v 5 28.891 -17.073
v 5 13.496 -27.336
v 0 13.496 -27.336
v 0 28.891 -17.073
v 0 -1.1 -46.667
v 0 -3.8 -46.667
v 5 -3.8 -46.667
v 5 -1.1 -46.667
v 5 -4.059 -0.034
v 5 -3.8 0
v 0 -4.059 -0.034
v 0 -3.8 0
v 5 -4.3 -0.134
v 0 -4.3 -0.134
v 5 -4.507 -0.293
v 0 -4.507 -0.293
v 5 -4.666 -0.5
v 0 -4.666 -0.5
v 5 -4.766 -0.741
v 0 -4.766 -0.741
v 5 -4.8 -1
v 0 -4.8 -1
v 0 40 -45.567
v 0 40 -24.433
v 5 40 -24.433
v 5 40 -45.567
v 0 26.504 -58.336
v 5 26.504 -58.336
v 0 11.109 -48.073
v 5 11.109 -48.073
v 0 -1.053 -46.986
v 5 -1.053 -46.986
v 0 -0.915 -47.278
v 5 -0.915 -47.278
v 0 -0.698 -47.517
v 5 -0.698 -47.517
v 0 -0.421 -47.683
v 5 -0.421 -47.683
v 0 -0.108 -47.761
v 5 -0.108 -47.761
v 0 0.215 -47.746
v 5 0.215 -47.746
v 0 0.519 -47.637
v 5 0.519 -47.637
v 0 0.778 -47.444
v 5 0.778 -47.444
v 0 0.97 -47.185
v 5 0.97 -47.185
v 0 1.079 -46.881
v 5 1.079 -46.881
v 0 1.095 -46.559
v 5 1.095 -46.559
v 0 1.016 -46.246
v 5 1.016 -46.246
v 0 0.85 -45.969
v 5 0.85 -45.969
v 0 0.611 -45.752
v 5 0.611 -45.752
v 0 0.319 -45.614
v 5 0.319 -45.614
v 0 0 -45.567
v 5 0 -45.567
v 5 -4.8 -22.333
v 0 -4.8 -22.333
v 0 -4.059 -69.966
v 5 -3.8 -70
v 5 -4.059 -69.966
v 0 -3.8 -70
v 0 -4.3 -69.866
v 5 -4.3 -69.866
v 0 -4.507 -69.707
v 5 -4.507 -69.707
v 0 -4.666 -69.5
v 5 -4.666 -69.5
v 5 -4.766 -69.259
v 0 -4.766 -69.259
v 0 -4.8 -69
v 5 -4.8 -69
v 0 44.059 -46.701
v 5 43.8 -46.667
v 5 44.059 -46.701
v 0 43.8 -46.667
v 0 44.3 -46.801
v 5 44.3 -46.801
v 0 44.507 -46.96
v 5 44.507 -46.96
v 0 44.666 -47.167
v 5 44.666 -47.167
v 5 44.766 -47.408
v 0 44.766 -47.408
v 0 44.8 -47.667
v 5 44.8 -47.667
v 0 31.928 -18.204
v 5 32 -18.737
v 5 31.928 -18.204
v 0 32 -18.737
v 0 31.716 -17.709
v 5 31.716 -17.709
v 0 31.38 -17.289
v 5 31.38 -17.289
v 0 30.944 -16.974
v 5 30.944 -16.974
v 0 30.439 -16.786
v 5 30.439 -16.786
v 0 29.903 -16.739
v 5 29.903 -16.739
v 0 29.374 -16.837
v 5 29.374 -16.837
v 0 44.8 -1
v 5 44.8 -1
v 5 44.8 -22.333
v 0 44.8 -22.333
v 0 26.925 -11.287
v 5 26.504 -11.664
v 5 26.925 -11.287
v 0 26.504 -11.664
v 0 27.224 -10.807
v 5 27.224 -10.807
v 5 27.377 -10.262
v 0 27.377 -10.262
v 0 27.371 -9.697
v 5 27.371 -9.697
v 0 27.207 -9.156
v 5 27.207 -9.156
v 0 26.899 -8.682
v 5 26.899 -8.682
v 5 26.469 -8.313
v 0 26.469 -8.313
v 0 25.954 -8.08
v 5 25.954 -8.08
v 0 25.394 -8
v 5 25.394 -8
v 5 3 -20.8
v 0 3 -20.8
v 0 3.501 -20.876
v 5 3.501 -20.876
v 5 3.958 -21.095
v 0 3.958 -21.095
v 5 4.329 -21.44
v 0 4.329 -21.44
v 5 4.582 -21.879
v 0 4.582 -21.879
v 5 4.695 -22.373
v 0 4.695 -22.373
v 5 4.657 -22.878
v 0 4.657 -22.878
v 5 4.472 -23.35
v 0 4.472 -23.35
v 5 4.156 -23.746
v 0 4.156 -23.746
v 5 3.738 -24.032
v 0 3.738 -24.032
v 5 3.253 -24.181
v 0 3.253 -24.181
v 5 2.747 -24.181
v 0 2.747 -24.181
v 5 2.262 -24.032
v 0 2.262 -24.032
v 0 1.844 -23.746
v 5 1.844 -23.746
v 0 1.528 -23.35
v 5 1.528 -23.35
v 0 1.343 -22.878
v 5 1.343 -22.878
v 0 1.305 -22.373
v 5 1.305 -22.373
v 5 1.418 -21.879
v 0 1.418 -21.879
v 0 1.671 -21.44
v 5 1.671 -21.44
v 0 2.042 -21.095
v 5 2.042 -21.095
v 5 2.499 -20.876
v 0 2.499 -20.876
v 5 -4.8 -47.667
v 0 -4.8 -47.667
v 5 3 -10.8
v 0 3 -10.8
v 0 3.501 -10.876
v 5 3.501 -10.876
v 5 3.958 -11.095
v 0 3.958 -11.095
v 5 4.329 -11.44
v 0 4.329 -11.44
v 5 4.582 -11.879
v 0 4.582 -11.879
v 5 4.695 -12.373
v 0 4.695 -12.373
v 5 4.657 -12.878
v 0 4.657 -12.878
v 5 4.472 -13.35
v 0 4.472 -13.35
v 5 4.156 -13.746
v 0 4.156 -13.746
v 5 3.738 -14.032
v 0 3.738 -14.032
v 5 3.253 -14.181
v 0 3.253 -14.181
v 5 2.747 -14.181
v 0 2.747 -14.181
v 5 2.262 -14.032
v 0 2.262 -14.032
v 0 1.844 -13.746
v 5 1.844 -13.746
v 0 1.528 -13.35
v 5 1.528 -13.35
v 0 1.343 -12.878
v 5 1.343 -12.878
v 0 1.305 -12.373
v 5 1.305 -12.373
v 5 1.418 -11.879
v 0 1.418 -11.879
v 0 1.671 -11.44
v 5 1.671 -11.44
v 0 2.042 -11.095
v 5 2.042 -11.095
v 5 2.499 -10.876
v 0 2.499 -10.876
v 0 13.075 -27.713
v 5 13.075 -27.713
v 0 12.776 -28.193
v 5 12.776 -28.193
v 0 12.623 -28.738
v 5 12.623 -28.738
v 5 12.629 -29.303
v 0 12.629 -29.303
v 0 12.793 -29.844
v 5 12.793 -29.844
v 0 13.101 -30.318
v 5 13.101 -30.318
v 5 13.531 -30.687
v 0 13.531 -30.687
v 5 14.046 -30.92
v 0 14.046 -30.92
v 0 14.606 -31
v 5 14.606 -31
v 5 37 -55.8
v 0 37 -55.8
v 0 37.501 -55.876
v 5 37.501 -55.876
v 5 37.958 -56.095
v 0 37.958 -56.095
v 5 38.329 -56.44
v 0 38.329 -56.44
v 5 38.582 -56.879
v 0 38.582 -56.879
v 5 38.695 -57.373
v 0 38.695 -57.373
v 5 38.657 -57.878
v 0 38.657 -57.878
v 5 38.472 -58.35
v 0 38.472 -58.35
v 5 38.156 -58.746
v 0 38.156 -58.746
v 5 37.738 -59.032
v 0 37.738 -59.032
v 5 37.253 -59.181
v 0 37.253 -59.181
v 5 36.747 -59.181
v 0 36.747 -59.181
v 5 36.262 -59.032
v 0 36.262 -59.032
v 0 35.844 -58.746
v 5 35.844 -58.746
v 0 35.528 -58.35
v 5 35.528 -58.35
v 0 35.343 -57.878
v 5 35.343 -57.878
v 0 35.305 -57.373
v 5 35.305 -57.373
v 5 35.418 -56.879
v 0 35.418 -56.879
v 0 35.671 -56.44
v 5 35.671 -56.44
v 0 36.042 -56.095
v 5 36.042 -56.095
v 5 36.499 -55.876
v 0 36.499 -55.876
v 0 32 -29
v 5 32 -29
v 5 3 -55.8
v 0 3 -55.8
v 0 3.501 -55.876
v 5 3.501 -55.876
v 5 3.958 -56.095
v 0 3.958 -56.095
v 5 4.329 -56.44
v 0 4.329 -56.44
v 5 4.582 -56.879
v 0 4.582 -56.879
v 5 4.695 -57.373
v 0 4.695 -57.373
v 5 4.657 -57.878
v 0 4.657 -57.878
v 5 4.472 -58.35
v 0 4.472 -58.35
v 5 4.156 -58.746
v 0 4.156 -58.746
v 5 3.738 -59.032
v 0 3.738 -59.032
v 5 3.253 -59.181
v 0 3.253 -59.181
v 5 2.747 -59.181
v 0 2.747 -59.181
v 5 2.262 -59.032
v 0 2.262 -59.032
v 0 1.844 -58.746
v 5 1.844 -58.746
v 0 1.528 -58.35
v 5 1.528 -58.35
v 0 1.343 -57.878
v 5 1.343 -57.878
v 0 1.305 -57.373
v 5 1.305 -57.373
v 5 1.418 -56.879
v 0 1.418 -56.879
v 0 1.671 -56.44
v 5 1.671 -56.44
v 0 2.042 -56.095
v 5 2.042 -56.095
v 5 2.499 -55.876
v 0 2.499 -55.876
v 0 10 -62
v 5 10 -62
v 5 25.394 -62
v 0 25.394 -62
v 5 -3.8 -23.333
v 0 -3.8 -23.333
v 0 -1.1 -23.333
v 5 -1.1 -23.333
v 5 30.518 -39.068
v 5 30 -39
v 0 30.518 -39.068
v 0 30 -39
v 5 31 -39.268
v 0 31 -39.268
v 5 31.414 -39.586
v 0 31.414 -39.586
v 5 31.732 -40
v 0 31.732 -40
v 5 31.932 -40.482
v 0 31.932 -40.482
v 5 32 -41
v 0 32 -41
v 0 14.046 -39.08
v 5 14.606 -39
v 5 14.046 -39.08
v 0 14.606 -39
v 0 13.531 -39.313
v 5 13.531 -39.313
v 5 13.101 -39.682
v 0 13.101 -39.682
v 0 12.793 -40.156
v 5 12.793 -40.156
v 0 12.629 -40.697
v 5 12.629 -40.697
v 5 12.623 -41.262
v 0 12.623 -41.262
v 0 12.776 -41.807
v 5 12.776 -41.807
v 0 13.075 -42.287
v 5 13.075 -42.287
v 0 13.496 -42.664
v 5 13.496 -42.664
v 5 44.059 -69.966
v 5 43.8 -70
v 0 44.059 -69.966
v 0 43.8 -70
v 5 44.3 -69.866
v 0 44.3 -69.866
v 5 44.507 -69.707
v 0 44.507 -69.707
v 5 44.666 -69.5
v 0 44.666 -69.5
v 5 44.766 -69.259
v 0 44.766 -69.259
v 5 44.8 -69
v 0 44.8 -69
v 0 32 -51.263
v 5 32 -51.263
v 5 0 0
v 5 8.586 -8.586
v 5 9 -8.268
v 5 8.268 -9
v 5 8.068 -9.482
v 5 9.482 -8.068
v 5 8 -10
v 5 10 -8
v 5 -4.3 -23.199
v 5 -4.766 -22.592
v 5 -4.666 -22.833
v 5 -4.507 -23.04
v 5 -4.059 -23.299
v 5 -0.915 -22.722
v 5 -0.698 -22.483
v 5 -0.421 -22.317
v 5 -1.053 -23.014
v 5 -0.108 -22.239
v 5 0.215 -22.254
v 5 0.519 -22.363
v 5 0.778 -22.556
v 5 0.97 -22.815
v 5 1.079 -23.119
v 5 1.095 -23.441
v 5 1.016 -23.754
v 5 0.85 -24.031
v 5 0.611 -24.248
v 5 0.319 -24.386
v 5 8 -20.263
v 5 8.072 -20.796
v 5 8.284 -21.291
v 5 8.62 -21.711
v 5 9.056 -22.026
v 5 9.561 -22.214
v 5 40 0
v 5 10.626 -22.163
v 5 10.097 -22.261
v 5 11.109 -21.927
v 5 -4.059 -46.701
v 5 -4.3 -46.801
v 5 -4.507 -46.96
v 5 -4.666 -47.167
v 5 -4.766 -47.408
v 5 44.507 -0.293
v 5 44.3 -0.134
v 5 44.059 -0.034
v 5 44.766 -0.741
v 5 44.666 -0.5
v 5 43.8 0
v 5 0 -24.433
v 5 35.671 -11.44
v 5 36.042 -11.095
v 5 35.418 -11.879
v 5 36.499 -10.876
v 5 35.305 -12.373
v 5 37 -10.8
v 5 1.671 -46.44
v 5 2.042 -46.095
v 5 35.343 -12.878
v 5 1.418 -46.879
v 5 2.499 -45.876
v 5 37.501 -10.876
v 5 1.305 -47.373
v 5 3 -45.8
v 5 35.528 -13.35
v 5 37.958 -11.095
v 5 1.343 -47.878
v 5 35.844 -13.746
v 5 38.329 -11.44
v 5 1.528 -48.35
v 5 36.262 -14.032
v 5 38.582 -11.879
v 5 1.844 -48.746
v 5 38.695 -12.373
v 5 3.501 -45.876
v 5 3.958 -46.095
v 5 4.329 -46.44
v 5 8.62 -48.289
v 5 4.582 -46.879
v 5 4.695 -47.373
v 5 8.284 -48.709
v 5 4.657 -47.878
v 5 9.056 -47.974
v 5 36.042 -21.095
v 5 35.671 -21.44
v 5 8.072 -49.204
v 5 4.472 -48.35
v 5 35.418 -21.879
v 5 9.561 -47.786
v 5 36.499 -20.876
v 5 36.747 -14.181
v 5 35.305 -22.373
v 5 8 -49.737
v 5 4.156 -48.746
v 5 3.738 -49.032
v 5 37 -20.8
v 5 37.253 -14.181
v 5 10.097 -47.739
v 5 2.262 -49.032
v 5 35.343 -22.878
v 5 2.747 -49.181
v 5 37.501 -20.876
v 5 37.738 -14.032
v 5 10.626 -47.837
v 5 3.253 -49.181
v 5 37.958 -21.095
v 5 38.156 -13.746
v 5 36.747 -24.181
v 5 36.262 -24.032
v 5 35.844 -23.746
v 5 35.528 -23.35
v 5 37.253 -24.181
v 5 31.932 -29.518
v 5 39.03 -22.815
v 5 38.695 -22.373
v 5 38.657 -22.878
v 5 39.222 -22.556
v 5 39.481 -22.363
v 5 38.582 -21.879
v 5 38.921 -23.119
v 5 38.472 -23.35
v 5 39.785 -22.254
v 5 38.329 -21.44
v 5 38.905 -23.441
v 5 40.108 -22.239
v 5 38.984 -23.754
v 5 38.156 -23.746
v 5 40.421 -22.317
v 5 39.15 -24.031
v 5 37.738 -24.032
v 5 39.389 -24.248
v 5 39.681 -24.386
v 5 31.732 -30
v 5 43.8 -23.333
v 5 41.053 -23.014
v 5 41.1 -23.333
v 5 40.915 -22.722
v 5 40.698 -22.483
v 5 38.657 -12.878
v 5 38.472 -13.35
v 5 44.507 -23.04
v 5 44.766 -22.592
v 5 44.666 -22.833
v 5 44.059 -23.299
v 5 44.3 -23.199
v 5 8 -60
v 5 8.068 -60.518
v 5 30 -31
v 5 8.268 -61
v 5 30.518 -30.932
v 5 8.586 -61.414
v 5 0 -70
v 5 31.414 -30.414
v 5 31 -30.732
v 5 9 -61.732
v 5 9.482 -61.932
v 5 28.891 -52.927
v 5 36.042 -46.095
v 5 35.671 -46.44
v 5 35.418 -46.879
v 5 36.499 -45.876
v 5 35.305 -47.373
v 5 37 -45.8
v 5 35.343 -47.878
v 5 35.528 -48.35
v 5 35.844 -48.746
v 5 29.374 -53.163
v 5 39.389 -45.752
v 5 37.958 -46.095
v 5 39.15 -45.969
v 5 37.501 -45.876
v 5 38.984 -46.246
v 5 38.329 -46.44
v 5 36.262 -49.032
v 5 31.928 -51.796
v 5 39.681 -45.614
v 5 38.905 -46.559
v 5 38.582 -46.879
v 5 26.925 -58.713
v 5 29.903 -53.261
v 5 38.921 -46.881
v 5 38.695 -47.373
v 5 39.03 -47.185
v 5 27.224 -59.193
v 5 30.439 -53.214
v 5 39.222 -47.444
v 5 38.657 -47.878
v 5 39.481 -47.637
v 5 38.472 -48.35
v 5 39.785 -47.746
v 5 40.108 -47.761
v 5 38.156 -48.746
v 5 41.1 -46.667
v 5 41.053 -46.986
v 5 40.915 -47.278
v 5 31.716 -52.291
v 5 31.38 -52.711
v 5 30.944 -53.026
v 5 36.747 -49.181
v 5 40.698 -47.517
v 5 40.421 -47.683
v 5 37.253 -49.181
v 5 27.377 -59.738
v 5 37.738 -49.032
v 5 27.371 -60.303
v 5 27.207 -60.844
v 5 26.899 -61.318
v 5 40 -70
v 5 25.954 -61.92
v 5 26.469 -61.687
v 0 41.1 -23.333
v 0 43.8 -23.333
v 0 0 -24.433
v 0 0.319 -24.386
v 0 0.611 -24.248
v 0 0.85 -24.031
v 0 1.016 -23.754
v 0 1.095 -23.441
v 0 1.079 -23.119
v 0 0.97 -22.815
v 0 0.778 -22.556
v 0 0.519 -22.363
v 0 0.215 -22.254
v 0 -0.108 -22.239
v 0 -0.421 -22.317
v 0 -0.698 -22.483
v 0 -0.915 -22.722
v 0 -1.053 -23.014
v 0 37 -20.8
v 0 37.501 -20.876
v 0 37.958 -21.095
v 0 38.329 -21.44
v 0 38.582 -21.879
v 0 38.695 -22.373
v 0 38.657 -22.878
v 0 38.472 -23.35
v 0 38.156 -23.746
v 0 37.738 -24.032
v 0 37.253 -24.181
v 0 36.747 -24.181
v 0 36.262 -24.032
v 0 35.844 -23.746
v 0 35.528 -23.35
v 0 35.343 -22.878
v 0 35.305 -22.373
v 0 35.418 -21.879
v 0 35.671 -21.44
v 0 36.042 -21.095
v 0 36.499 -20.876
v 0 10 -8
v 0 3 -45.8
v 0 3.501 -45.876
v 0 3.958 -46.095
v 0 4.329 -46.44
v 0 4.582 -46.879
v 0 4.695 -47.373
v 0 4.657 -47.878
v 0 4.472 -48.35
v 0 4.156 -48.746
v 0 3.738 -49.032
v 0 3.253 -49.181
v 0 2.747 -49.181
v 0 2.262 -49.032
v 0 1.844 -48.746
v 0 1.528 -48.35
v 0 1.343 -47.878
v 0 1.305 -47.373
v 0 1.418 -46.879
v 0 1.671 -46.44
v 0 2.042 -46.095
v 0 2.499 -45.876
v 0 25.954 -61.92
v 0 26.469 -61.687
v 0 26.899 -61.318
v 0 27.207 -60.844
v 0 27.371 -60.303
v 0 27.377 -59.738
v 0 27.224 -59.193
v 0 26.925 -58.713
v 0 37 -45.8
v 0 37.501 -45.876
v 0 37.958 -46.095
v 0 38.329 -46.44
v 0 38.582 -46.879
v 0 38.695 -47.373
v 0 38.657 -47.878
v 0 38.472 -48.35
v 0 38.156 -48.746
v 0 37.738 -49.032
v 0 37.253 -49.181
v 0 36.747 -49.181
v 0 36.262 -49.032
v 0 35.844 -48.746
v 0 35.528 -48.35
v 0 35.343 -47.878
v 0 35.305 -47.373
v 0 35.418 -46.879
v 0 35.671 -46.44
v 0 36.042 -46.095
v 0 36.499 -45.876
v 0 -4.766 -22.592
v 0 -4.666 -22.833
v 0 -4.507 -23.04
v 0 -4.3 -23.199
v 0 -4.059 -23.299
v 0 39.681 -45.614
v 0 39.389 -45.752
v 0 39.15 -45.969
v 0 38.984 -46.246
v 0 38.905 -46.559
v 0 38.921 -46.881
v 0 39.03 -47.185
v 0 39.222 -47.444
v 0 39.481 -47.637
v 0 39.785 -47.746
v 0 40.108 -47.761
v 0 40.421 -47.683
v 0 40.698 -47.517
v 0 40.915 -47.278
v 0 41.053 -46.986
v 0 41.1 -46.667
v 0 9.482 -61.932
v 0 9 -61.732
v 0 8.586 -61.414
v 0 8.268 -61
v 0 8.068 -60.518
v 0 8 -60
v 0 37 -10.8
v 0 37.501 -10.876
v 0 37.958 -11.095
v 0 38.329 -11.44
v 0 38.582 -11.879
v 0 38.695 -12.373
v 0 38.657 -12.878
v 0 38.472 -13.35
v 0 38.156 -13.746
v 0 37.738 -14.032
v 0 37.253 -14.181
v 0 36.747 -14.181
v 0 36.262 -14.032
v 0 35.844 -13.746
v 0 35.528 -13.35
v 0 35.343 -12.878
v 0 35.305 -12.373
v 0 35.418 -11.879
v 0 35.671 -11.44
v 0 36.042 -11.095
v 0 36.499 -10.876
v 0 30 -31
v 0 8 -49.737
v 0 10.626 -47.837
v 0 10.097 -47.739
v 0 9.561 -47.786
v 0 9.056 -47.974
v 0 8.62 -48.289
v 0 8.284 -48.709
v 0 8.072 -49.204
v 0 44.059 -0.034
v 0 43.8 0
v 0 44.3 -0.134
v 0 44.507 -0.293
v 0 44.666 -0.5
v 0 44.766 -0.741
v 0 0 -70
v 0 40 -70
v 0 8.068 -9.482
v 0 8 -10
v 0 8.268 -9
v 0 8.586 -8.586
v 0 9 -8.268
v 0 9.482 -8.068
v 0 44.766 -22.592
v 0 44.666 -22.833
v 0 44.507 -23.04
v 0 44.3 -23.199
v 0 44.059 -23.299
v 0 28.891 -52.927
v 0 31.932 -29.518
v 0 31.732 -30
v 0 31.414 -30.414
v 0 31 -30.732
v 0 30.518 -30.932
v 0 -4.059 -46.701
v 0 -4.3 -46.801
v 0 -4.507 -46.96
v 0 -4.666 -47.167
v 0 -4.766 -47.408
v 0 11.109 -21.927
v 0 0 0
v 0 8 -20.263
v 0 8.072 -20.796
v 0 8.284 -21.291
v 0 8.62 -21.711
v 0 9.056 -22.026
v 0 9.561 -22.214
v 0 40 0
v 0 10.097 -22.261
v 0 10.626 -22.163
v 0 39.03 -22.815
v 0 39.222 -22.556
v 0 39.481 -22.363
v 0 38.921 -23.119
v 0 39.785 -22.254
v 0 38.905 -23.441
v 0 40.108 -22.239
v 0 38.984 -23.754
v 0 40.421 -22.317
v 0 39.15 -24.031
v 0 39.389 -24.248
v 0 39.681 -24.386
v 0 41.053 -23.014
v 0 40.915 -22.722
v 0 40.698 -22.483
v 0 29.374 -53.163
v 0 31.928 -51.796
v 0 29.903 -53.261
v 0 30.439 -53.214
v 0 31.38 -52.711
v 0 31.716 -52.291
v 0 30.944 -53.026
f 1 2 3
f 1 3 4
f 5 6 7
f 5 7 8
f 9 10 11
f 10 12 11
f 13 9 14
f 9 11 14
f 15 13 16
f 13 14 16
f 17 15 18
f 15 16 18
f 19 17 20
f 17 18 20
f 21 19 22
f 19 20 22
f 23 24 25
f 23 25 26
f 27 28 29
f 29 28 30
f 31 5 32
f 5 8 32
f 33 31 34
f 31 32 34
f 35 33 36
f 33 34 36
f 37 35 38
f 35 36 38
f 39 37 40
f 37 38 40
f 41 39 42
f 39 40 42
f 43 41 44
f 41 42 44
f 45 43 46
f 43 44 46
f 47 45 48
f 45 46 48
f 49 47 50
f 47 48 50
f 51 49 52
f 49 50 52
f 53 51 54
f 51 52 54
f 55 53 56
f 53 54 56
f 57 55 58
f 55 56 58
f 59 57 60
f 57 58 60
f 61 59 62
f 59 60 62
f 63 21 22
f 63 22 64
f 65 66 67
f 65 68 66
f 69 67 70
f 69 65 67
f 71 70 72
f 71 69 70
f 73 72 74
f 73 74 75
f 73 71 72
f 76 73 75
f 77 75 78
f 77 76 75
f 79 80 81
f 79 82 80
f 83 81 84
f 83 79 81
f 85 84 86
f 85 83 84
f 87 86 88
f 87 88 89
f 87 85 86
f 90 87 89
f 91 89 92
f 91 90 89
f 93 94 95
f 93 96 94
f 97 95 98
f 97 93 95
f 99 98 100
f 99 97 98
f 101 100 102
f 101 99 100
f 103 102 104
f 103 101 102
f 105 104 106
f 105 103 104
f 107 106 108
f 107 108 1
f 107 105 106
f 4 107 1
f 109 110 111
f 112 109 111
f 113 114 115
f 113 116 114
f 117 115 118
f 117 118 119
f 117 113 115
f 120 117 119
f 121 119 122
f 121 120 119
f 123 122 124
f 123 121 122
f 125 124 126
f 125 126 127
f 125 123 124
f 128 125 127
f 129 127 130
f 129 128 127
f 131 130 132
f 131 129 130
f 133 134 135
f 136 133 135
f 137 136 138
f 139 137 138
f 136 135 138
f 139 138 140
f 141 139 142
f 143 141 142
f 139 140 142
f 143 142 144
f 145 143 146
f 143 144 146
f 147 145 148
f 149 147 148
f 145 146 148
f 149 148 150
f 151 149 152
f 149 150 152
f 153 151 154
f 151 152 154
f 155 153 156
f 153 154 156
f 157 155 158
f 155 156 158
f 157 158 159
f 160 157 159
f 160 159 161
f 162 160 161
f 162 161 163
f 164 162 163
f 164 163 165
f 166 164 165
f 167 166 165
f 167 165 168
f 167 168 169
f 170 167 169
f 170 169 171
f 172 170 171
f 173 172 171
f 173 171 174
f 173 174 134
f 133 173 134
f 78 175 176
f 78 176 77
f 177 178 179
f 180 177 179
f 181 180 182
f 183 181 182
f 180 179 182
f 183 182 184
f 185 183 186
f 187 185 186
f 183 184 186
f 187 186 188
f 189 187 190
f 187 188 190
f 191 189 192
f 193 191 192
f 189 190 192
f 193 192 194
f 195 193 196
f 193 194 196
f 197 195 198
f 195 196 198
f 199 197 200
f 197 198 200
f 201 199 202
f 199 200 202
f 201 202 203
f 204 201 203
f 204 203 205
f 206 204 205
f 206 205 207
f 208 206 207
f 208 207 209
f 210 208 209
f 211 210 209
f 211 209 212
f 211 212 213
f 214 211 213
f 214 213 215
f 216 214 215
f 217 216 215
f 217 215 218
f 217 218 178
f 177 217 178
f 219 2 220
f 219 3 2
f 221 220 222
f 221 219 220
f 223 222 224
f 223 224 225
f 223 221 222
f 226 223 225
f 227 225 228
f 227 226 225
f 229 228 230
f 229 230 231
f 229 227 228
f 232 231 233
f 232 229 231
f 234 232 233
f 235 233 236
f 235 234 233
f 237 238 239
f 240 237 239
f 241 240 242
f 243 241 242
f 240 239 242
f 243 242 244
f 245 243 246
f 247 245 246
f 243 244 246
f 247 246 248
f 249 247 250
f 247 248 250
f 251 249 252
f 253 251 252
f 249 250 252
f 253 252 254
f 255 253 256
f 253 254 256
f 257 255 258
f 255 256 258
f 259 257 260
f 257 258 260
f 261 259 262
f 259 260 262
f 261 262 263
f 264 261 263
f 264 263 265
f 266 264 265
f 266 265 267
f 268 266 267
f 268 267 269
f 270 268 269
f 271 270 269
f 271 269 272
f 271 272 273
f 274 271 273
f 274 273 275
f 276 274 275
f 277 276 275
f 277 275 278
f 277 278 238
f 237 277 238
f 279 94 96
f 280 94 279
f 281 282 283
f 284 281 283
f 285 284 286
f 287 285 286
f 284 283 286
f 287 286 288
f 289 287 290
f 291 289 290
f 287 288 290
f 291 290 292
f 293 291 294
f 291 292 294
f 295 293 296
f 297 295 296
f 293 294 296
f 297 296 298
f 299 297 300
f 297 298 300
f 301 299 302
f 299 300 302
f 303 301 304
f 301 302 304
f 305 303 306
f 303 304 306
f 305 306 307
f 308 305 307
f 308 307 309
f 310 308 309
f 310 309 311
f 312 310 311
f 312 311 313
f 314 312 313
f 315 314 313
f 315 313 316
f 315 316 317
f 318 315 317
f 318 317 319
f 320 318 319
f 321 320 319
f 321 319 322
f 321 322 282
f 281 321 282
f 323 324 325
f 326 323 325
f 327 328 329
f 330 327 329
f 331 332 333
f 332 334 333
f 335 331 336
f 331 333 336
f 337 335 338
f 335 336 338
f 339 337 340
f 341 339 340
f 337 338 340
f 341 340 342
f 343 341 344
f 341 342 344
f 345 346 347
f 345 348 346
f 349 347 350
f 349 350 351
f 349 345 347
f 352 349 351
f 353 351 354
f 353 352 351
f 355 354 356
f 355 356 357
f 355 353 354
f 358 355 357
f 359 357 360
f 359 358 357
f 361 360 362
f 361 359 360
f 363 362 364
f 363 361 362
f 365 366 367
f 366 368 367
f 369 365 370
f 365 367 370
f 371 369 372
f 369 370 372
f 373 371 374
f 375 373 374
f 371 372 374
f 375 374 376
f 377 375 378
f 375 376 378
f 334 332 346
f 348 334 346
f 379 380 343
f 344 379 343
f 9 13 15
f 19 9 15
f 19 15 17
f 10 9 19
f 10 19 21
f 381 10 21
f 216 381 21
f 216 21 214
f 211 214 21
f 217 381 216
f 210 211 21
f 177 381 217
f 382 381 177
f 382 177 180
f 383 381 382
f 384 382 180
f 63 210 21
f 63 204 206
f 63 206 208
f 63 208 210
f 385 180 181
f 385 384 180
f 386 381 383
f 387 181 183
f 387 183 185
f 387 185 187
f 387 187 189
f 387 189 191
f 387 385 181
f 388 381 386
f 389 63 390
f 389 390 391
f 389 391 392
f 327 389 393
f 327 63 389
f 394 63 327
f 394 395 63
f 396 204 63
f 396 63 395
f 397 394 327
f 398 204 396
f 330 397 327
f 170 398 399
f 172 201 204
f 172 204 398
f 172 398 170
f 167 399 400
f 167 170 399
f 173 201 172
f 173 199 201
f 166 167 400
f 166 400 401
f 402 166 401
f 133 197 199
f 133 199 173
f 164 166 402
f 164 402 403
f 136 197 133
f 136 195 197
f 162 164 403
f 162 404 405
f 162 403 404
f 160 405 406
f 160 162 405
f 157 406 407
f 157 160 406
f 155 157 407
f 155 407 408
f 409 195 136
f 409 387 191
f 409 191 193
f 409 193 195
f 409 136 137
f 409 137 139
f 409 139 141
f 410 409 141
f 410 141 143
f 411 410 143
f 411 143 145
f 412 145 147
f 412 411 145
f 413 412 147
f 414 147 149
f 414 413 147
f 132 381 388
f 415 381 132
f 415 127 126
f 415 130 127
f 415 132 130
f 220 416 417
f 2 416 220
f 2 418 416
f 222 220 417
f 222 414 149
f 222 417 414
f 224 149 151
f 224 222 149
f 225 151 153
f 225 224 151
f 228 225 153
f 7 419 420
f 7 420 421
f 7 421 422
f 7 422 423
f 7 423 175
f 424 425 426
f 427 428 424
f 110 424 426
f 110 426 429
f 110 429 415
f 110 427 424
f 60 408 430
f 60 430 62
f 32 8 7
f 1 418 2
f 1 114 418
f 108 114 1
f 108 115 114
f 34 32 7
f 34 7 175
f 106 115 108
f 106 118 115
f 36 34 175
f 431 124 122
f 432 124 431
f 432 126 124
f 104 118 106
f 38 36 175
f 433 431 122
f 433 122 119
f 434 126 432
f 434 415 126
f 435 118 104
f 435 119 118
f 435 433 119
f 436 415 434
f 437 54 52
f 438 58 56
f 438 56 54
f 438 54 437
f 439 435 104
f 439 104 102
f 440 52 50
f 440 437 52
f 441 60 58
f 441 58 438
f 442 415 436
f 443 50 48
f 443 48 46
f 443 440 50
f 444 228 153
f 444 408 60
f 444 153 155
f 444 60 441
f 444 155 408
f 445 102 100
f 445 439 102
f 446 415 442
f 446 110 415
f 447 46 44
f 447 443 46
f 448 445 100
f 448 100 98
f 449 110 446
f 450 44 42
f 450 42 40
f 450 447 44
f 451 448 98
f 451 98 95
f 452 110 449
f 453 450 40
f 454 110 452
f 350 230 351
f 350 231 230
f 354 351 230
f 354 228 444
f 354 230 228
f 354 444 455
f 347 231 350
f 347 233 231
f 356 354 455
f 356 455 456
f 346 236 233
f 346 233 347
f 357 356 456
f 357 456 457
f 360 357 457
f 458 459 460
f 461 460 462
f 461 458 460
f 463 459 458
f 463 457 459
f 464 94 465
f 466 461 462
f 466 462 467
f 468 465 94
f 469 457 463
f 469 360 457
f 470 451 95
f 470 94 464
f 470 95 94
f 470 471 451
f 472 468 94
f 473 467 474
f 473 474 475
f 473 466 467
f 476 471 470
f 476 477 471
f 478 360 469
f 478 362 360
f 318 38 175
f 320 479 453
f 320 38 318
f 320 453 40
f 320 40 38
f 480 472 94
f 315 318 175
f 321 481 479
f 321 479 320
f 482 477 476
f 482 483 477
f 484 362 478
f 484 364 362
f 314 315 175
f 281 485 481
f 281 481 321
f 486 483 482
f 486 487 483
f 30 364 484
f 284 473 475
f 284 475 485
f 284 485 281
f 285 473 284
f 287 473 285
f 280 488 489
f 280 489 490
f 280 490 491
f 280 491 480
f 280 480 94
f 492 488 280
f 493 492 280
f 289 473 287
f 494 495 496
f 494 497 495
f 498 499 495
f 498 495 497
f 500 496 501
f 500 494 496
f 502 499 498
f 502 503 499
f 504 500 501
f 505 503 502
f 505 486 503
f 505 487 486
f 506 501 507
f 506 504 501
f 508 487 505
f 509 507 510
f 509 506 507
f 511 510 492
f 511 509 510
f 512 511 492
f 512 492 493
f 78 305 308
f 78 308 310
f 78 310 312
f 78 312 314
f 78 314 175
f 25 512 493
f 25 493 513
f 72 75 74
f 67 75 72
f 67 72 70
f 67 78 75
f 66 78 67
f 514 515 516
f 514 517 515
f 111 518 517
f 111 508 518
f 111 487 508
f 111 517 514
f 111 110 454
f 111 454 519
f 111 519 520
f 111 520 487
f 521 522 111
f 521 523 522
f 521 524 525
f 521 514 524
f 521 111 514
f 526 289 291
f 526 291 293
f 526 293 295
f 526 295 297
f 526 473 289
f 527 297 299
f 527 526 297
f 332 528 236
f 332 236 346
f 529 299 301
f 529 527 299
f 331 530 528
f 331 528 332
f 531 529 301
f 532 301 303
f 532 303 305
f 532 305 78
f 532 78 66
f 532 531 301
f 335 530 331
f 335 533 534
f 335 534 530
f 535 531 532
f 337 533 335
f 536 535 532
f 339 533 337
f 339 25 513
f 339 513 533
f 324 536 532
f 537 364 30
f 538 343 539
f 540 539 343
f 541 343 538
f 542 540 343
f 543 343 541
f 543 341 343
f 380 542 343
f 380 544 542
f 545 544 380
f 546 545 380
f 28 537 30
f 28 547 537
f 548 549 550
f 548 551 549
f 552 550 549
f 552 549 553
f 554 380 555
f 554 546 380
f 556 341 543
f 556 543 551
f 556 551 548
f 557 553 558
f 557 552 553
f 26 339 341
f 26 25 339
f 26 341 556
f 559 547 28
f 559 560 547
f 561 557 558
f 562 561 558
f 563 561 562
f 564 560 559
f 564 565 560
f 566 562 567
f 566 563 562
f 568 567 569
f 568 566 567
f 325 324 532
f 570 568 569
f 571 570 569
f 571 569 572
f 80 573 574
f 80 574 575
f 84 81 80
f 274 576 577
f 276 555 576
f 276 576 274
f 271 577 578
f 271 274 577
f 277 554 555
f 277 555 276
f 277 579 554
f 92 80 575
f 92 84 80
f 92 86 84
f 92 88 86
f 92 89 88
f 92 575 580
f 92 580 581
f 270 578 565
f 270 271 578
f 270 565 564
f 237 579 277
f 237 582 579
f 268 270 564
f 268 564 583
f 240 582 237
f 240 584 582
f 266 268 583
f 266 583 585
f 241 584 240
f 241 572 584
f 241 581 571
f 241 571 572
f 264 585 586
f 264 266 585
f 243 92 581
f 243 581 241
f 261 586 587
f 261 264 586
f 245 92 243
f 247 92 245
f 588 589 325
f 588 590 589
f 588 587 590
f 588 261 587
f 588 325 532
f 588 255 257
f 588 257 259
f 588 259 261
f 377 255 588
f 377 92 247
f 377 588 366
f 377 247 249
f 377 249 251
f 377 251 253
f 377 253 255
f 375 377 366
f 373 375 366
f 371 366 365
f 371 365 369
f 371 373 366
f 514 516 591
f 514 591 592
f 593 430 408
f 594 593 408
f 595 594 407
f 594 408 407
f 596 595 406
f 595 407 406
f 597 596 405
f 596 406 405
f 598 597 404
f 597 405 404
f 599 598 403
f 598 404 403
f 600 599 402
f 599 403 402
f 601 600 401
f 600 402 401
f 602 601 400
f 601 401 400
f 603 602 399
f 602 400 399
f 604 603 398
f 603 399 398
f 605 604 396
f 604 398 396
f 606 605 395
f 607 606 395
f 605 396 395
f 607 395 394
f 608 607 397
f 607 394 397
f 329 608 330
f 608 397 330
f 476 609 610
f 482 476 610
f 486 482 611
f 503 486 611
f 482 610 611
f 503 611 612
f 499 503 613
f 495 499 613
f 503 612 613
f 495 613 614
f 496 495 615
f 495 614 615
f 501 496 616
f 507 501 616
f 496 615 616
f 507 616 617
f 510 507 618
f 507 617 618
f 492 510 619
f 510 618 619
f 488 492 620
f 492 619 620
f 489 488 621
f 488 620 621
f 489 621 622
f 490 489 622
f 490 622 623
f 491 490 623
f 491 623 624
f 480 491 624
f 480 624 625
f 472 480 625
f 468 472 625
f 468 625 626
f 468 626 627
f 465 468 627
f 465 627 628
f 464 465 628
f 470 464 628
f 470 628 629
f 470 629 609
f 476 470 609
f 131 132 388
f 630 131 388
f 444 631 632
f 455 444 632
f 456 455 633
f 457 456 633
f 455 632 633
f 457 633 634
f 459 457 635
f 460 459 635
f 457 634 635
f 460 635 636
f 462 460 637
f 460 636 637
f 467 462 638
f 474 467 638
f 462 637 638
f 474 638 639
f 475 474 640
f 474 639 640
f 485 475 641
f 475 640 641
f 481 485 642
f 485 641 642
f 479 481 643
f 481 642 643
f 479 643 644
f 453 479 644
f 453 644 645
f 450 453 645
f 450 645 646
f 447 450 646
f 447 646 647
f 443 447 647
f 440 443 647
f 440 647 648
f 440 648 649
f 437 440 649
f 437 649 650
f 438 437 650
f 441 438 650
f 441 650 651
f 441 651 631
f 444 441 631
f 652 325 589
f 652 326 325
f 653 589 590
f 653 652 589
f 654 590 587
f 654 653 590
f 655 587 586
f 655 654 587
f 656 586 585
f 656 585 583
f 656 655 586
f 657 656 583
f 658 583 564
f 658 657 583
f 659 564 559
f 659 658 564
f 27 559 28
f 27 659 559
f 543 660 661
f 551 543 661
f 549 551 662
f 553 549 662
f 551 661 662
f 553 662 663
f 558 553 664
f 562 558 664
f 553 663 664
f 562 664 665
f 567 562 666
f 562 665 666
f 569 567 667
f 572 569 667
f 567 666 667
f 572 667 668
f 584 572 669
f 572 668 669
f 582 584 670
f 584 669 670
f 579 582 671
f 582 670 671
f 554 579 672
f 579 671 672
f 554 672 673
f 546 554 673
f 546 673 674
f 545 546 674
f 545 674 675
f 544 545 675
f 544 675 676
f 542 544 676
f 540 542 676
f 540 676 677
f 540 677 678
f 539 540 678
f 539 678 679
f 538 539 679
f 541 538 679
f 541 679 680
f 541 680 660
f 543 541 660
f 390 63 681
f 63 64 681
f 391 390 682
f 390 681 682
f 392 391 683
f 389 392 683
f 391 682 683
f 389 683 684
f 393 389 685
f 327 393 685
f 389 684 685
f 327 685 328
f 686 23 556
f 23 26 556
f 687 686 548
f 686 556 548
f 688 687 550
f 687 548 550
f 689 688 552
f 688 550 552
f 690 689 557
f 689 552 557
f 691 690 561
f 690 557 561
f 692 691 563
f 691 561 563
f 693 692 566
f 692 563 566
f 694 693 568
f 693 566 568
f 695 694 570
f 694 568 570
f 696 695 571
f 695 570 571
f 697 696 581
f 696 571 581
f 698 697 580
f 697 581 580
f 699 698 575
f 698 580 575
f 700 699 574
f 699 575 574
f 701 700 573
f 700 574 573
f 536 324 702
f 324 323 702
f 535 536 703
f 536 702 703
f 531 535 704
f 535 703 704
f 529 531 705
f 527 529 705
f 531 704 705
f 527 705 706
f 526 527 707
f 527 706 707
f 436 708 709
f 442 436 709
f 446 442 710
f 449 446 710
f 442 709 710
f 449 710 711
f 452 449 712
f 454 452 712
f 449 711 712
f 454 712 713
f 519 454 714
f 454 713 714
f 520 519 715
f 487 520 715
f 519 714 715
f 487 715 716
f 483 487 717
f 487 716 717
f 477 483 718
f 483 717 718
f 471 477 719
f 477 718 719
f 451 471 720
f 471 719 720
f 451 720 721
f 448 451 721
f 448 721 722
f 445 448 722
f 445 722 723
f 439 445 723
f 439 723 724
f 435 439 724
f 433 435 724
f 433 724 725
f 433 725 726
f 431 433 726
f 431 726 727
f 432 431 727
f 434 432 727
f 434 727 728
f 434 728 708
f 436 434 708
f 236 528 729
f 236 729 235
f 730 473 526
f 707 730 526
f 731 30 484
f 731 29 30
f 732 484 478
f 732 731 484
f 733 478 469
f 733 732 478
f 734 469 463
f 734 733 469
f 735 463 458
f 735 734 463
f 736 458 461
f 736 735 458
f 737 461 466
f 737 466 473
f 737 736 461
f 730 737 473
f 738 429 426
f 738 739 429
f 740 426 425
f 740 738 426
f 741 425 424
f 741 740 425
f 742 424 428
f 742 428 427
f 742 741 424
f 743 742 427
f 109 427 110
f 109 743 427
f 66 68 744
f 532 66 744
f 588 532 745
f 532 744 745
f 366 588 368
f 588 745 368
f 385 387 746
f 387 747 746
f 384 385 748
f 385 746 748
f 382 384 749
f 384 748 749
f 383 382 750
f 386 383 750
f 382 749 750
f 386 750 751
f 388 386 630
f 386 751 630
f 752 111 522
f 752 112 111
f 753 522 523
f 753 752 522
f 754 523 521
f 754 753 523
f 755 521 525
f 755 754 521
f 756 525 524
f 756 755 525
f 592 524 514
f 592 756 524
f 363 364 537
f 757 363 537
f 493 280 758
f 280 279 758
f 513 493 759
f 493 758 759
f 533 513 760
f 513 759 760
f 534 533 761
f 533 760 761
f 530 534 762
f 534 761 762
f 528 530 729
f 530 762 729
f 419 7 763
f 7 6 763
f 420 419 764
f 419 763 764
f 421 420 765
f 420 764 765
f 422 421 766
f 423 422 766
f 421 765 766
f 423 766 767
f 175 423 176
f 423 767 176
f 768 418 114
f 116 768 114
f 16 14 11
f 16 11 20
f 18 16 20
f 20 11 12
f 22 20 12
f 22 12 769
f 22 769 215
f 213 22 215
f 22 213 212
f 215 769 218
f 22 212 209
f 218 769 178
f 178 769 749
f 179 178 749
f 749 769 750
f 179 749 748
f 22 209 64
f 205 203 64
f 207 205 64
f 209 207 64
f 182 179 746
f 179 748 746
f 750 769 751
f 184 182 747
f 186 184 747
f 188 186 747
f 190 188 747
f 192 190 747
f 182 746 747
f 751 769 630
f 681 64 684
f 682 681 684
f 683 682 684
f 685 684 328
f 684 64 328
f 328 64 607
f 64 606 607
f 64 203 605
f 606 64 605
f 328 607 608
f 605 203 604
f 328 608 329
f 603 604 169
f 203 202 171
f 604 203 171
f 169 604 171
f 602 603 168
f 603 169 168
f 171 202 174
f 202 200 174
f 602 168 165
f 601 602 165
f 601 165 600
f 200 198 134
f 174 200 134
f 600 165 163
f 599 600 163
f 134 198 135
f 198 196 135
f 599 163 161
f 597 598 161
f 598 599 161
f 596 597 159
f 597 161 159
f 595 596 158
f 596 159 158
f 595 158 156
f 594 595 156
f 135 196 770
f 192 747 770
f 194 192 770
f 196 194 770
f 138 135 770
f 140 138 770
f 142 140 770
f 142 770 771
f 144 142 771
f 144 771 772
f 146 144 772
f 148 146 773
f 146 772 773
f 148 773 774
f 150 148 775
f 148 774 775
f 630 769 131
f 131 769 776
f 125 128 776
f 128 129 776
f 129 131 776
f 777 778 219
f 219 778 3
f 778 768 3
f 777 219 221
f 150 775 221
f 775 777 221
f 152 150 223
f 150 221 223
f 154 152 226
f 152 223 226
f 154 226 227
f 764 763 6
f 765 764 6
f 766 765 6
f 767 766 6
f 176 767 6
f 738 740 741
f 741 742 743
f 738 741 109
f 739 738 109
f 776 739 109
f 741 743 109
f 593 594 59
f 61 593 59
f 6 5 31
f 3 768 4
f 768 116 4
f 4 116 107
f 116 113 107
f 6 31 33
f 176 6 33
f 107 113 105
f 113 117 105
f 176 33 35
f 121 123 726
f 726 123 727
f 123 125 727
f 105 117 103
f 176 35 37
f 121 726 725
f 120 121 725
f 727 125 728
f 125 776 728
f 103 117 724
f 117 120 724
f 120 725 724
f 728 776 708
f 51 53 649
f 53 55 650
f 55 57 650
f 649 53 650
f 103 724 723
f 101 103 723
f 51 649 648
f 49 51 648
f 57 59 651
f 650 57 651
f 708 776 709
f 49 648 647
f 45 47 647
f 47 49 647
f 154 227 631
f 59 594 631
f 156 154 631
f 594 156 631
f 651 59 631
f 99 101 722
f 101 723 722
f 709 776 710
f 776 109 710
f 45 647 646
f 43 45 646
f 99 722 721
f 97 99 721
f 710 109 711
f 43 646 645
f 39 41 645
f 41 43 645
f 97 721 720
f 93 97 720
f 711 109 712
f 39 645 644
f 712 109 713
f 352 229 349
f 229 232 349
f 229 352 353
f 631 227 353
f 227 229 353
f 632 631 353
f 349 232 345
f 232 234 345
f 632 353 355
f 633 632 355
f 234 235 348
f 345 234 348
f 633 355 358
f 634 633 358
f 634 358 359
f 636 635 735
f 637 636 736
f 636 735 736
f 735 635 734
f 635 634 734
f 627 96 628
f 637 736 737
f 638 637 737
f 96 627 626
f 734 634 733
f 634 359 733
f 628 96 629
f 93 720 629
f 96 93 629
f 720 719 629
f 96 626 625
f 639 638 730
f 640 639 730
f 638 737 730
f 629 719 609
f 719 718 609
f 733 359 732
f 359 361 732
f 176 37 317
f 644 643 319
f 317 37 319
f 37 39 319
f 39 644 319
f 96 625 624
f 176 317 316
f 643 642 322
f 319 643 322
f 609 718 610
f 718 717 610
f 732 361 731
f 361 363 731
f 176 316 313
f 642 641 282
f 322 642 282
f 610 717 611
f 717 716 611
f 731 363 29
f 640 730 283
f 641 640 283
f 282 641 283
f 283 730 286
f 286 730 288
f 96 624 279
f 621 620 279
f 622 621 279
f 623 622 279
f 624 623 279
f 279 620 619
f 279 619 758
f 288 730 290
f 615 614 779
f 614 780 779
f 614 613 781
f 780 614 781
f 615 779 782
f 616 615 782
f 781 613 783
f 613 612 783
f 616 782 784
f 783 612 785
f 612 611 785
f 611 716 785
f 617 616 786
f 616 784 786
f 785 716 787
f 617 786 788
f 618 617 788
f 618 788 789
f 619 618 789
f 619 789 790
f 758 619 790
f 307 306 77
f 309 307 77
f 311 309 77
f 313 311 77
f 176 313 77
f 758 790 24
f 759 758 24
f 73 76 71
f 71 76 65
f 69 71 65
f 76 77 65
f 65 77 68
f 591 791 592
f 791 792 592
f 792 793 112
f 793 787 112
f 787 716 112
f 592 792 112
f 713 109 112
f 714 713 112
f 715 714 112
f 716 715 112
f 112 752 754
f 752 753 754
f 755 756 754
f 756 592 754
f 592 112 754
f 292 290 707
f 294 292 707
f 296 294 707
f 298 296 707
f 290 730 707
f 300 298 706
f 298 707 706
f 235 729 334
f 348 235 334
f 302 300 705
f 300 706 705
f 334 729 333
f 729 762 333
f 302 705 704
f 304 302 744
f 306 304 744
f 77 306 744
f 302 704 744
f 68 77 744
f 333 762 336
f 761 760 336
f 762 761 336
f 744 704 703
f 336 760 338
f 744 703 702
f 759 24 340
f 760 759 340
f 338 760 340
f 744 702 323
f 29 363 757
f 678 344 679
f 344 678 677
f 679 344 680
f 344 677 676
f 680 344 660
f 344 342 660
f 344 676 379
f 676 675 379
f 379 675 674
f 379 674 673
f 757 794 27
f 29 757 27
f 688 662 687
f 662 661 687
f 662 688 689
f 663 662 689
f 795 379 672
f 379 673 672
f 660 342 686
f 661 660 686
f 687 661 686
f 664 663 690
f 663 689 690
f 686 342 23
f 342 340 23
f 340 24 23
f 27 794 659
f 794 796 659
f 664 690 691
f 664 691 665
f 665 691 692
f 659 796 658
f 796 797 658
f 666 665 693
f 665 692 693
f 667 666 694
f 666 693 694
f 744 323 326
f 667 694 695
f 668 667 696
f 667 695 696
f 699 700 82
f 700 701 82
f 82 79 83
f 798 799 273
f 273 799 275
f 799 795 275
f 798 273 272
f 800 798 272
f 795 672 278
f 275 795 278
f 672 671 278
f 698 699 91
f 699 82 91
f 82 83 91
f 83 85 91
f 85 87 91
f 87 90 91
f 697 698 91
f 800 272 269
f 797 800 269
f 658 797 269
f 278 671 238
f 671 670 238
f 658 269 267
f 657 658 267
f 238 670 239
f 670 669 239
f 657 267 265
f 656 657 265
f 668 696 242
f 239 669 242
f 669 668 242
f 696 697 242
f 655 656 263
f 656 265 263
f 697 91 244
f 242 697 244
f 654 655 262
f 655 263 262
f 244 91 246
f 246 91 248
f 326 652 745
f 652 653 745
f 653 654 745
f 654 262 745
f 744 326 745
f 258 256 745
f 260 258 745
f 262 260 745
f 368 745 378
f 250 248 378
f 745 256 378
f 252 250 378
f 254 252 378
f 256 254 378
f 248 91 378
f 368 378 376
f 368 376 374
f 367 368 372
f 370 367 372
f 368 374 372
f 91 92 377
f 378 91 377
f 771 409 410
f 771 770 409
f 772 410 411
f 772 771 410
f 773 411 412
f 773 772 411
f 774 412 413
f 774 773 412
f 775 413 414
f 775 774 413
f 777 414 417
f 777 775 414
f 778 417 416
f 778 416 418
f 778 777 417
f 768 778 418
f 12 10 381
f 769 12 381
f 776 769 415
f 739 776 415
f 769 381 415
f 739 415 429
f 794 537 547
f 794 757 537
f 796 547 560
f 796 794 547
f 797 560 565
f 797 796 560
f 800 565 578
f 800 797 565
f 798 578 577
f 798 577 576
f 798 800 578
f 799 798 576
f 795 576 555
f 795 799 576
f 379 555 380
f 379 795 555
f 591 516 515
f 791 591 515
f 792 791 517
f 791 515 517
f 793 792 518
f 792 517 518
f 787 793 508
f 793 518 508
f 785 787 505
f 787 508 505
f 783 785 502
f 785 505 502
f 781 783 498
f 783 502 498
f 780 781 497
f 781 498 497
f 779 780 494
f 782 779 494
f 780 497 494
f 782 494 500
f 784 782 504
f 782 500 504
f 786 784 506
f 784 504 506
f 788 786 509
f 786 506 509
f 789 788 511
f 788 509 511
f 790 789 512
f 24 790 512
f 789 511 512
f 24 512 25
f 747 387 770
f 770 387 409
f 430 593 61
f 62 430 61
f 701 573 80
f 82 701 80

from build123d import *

# Parameters (mm, degrees)
SKETCH_1_W          = 70
SKETCH_1_H          = 40
EXTRUDE_1_DEPTH     = 5
CUT_EXTRUDE_1_DEPTH = 5
FILLET_1_R          = 2
SKETCH_3_W          = 23.333333333
SKETCH_3_H          = 4.8
EXTRUDE_2_DEPTH     = 5
FILLET_2_R          = 1
SKETCH_4_R          = 1.1
CUT_EXTRUDE_2_DEPTH = 5
HOLE_WIZARD_M3_1_D  = 3.4


with BuildPart() as part:
    # 草图1 → 凸台-拉伸1 (new body)
    with BuildSketch(Plane(origin=(0, 0, 0), x_dir=(0, 0, -1), z_dir=(1, 0, 0))):
        with Locations((35, 20)):
            Rectangle(SKETCH_1_W, SKETCH_1_H)
    extrude(amount=EXTRUDE_1_DEPTH)

    # 草图2 → 切除-拉伸1 (cut)
    with BuildSketch(Plane(origin=(5, 0, 0), x_dir=(0, 0, -1), z_dir=(1, 0, 0))):
        Polygon((8, 8), (24, 8), (8, 32), align=None)
        Polygon((31, 32), (31, 8), (15, 32), align=None)
        Polygon((39, 32), (39, 8), (55, 32), align=None)
        Polygon((62, 8), (62, 32), (46, 8), align=None)
    extrude(amount=-CUT_EXTRUDE_1_DEPTH, mode=Mode.SUBTRACT)

    # 圆角1
    fillet_1_edges = [part.edges().sort_by_distance(p)[0] for p in [
        (2.5, 32, -31),
        (2.5, 8, -31),
        (2.5, 32, -15),
        (2.5, 8, -39),
        (2.5, 32, -39),
        (2.5, 32, -55),
        (2.5, 32, -62),
        (2.5, 8, -62),
        (2.5, 8, -46),
        (2.5, 8, -8),
        (2.5, 32, -8),
        (2.5, 8, -24),
    ]]
    fillet(fillet_1_edges, radius=FILLET_1_R)

    # 草图3 → 凸台-拉伸2 (add)
    with BuildSketch(Plane(origin=(5, 0, 0), x_dir=(0, 0, -1), z_dir=(1, 0, 0))):
        with Locations((11.666666667, 42.4)):
            Rectangle(SKETCH_3_W, SKETCH_3_H)
        with Locations((58.333333334, 42.4)):
            Rectangle(SKETCH_3_W, SKETCH_3_H)
        with Locations((58.333333334, -2.4)):
            Rectangle(SKETCH_3_W, SKETCH_3_H)
        with Locations((11.666666667, -2.4)):
            Rectangle(SKETCH_3_W, SKETCH_3_H)
    extrude(amount=-EXTRUDE_2_DEPTH)

    # 圆角2
    fillet_2_edges = [part.edges().sort_by_distance(p)[0] for p in [
        (2.5, 44.8, 0),
        (2.5, 44.8, -23.333333333),
        (2.5, 44.8, -70),
        (2.5, 44.8, -46.666666667),
        (2.5, -4.8, -23.333333333),
        (2.5, -4.8, 0),
        (2.5, -4.8, -70),
        (2.5, -4.8, -46.666666667),
    ]]
    fillet(fillet_2_edges, radius=FILLET_2_R)

    # 草图4 → 切除-拉伸2 (cut)
    with BuildSketch(Plane(origin=(5, 0, 0), x_dir=(0, 0, -1), z_dir=(1, 0, 0))):
        with Locations((23.333333333, 40)):
            Circle(SKETCH_4_R)
        with Locations((46.666666667, 40)):
            Circle(SKETCH_4_R)
        with Locations((46.666666667, 0)):
            Circle(SKETCH_4_R)
        with Locations((23.333333333, 0)):
            Circle(SKETCH_4_R)
    extrude(amount=-CUT_EXTRUDE_2_DEPTH, mode=Mode.SUBTRACT)

    # M3 间隙孔1 (through all)
    with Locations(Plane(origin=(5, 0, 0), x_dir=(0, 0, -1), z_dir=(1, 0, 0))):
        with Locations((57.5, 37), (47.5, 37), (57.5, 3), (47.5, 3), (22.5, 3), (12.5, 3), (22.5, 37), (12.5, 37)):
            Hole(HOLE_WIZARD_M3_1_D / 2)


solid = part.part
